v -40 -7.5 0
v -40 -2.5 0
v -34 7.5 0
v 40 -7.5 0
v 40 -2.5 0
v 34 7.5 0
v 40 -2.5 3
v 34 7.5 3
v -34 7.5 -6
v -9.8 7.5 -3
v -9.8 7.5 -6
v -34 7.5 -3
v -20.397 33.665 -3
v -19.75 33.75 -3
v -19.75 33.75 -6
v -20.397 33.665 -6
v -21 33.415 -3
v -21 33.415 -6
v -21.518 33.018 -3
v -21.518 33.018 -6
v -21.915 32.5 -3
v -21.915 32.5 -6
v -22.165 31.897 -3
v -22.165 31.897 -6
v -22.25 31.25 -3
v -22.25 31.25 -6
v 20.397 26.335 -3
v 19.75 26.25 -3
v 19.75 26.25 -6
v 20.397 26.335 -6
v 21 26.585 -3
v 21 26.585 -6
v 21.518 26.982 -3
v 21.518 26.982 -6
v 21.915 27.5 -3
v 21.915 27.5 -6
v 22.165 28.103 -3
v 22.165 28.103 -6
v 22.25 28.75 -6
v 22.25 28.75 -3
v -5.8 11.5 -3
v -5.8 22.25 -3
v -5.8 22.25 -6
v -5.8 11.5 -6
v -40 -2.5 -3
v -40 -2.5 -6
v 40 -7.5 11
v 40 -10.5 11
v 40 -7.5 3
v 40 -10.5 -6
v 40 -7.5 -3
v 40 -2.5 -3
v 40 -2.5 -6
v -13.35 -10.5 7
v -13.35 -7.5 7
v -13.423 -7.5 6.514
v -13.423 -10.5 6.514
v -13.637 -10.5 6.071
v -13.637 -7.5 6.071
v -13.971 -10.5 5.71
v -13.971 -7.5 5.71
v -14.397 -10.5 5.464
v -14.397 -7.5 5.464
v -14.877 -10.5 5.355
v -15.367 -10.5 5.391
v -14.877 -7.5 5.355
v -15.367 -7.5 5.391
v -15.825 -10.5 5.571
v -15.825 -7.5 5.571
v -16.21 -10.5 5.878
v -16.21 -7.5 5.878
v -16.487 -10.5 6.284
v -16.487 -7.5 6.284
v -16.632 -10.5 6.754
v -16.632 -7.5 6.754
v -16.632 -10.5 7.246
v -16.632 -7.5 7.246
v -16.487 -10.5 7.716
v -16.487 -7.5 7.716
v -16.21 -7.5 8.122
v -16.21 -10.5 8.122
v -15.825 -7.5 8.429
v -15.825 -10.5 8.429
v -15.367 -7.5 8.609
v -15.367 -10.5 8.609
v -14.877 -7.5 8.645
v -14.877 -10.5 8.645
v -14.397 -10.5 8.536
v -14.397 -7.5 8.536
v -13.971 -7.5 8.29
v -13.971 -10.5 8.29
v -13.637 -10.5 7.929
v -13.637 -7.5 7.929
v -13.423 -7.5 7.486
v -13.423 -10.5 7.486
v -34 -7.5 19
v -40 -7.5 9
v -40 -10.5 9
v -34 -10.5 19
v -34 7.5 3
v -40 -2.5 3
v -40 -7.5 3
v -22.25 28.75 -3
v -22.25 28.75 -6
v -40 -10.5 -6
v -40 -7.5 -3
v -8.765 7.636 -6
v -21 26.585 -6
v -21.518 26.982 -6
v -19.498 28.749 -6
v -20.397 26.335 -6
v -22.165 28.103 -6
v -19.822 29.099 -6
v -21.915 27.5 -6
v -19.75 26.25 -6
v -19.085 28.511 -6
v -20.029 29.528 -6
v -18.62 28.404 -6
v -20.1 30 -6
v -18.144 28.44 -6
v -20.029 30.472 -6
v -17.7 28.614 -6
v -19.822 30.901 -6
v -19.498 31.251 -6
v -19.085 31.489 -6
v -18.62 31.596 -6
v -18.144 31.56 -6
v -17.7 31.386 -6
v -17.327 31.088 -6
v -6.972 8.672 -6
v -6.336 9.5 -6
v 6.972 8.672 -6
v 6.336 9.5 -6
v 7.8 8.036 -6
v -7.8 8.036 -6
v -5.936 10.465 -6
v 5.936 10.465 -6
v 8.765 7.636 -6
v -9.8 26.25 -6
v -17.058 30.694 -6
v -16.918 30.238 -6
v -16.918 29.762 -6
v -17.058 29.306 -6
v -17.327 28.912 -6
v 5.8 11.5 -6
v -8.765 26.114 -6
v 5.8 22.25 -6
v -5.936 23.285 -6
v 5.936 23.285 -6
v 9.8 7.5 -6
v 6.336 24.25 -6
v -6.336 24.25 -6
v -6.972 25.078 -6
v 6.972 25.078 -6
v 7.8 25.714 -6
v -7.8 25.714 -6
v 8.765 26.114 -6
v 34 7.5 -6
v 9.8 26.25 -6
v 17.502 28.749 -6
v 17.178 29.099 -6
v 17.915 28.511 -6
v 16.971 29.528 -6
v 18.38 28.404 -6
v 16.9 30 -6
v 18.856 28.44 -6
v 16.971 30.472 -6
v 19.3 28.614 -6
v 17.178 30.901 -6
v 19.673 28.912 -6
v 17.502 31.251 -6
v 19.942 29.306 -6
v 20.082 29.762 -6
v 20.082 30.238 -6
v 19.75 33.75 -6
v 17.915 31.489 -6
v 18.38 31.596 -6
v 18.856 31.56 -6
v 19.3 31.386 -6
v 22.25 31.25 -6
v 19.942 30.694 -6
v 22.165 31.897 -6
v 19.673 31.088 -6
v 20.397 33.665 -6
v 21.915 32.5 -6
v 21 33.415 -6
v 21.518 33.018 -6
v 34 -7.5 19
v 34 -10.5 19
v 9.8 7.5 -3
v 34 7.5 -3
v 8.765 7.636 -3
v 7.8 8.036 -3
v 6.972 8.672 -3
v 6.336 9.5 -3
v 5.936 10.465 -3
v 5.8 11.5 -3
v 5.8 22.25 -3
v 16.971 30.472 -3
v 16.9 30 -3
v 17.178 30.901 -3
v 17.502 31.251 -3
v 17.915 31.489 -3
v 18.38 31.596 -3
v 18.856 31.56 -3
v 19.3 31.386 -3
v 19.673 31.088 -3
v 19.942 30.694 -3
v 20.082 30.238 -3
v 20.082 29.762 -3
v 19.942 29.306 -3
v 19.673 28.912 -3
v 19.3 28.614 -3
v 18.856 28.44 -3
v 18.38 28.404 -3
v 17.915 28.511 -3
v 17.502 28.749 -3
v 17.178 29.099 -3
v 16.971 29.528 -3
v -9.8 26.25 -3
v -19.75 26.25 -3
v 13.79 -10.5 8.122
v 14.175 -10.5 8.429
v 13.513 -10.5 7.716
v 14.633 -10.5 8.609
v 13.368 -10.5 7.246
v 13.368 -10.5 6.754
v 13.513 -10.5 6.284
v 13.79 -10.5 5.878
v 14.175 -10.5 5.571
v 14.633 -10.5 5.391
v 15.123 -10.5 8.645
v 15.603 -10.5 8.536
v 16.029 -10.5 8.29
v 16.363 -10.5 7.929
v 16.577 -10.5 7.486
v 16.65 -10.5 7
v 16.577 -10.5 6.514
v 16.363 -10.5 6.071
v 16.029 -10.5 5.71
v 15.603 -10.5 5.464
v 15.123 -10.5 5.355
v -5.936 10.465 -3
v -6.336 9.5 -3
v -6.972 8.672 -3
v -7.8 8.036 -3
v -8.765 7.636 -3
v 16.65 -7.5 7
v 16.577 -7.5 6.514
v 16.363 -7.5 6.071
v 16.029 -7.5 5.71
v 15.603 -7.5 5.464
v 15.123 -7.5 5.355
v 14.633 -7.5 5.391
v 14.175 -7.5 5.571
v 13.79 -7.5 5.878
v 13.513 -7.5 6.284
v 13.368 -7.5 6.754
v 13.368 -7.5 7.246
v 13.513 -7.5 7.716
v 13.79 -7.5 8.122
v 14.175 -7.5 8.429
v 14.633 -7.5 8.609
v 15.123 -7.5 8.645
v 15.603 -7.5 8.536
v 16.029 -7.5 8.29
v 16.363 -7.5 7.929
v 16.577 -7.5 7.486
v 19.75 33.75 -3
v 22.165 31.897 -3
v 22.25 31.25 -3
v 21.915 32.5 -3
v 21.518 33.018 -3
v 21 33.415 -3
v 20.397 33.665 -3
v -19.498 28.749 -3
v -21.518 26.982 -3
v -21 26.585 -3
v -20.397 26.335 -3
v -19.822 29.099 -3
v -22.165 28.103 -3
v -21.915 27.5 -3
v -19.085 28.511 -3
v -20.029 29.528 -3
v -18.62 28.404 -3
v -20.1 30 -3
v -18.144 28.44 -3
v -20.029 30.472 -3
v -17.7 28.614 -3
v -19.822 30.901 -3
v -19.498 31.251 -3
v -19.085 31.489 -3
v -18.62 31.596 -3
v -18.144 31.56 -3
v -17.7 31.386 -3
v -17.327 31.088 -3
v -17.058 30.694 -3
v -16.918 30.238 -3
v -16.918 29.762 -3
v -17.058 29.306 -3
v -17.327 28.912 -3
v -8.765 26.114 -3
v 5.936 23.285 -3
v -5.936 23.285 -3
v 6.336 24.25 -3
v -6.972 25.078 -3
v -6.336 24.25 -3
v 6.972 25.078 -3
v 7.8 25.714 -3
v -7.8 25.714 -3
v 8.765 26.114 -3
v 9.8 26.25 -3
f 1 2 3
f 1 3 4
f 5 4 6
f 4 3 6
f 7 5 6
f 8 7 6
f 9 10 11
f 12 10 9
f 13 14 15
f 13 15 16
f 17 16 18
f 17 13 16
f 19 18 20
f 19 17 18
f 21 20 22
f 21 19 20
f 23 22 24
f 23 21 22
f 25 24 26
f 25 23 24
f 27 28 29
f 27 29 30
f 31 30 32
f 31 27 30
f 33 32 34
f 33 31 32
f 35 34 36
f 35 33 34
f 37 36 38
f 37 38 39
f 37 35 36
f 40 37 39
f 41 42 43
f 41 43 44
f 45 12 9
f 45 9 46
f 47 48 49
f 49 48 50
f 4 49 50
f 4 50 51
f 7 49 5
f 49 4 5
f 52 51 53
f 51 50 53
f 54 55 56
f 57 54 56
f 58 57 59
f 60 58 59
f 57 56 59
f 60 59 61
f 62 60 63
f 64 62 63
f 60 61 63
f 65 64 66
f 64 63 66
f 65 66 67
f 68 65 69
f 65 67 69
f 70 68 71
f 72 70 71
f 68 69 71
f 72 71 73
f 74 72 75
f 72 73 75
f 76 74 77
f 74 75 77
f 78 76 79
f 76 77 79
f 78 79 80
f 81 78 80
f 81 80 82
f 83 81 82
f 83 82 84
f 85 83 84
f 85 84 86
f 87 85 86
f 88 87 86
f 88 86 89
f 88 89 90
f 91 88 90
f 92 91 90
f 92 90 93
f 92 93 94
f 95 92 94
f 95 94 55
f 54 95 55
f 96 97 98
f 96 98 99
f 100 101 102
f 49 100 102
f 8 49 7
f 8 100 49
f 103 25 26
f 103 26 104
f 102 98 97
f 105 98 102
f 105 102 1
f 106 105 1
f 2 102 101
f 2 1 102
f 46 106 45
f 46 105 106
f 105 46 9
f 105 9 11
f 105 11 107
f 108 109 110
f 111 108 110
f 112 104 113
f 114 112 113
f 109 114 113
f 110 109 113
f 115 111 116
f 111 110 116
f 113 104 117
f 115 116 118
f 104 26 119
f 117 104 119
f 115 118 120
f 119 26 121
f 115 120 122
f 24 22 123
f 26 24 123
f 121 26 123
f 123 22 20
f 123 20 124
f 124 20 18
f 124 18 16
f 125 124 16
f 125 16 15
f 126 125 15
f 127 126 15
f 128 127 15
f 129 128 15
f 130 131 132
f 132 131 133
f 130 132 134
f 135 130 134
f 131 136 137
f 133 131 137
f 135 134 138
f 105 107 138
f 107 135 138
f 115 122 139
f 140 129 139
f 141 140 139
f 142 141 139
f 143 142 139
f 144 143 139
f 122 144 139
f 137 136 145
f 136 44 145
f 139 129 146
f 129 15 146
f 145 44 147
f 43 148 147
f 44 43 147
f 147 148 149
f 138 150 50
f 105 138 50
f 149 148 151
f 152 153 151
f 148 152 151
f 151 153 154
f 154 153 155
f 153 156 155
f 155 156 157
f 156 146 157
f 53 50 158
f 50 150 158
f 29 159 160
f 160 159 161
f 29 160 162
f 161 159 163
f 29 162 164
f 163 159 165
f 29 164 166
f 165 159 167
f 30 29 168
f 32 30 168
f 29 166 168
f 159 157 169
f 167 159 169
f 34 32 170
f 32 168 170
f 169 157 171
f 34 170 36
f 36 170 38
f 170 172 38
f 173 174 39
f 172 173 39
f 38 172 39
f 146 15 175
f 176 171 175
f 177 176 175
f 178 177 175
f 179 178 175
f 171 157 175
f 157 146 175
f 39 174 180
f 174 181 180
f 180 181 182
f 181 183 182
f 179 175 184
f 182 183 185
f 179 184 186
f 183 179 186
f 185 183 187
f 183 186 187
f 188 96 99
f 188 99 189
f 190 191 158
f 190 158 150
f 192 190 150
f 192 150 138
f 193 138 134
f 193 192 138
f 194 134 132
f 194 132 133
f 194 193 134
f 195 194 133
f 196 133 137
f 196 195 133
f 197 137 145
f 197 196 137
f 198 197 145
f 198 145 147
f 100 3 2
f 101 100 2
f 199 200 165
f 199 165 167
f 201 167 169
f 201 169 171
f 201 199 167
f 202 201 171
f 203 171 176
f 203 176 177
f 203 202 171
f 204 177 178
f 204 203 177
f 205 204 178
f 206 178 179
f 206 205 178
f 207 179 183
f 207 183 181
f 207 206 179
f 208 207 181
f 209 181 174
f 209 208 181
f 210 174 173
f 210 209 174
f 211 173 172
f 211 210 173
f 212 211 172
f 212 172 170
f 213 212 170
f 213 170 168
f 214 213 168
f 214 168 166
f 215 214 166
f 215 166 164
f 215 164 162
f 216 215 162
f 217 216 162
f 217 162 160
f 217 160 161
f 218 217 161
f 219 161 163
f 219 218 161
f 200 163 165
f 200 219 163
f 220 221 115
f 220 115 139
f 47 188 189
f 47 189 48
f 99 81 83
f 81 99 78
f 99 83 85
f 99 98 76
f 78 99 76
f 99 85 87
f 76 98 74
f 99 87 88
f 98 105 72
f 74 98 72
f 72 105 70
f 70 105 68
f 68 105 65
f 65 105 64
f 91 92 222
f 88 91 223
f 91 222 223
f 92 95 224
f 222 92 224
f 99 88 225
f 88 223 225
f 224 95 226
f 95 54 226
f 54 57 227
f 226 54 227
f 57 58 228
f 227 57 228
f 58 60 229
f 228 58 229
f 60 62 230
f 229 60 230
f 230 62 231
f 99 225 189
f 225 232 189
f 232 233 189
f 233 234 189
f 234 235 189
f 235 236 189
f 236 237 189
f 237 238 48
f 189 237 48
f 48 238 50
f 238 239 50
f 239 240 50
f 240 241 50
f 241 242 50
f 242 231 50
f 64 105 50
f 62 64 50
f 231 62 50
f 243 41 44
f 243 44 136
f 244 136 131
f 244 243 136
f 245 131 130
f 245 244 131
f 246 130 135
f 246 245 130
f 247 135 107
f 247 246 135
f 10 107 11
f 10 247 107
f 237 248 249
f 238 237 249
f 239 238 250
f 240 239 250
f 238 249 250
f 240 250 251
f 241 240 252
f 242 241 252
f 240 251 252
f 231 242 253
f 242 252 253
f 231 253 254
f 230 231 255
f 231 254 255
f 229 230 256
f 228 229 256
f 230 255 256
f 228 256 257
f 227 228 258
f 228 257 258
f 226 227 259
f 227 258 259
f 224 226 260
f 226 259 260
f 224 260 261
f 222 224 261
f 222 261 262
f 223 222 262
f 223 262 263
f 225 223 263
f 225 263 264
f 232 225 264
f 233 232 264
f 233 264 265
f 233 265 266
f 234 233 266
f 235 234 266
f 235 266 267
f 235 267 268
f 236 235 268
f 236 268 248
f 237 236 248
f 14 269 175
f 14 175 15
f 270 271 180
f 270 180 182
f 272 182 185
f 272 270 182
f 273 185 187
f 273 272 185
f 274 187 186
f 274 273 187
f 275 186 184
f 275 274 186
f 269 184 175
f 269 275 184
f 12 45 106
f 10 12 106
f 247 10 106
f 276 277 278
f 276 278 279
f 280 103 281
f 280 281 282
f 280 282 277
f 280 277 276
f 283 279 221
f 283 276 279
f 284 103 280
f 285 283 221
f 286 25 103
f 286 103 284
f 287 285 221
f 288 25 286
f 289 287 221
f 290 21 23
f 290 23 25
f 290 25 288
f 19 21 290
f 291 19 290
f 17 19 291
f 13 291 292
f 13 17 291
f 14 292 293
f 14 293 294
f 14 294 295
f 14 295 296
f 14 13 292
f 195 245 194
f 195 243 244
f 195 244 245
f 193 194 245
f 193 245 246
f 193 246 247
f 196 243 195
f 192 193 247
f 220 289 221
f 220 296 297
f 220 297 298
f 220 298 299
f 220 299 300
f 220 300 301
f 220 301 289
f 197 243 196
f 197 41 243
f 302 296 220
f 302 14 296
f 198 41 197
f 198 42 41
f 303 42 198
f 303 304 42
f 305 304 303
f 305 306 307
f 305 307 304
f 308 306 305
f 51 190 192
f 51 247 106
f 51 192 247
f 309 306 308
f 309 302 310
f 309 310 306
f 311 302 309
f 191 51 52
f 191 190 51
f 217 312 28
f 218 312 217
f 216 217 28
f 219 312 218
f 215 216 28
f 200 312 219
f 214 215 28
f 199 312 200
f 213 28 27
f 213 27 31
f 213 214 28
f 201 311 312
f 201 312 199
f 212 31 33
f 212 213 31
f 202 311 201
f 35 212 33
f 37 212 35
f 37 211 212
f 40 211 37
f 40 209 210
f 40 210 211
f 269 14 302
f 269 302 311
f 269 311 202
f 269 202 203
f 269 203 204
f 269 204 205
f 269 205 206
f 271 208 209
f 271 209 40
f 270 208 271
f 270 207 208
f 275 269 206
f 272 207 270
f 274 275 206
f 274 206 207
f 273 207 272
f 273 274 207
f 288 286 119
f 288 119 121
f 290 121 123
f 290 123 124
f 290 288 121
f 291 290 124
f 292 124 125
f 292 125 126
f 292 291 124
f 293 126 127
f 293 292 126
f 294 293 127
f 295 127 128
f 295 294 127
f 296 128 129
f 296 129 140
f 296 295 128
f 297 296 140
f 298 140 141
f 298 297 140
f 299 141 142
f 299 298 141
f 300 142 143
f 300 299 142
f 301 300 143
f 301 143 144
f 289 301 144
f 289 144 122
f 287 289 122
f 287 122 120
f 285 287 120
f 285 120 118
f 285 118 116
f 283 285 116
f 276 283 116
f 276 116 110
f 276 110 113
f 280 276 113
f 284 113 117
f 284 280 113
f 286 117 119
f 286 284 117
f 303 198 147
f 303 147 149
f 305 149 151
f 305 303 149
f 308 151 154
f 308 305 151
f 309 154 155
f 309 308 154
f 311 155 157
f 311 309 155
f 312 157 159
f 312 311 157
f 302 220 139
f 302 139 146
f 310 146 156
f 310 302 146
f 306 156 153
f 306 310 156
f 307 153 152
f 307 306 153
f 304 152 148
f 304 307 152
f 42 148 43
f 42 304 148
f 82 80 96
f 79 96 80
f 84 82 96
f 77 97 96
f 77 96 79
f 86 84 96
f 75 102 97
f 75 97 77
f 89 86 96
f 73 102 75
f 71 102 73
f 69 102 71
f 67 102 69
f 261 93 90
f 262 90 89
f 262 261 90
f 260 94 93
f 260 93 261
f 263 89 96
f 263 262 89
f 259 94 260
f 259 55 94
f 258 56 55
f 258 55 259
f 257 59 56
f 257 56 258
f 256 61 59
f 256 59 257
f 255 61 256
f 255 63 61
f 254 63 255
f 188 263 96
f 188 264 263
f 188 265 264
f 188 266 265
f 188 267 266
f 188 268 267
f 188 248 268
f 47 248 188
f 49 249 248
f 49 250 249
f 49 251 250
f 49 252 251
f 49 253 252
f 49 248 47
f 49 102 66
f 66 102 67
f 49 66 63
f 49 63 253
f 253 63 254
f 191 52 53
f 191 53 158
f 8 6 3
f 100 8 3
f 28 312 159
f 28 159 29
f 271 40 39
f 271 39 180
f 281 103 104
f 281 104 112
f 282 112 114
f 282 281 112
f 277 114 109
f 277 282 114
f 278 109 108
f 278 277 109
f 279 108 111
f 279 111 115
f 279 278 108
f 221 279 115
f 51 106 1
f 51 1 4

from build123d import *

# Parameters (mm, degrees)
BOSS_EXTRUDE1_DEPTH = 3
SKETCH3_R           = 1.6
BOSS_EXTRUDE2_DEPTH = 3
SKETCH2_W           = 80
SKETCH2_H           = 3
BOSS_EXTRUDE3_DEPTH = 3
SKETCH8_W           = 80
SKETCH8_H           = 3
BOSS_EXTRUDE6_DEPTH = 16
SKETCH21_R          = 1.65
CUT_EXTRUDE1_DEPTH  = 4
CUT_EXTRUDE2_DEPTH  = 4


with BuildPart() as part:
    # Sketch1 → Boss-Extrude1 (new body)
    with BuildSketch(Plane.XY):
        Polygon((40, -2.5), (34, 7.5), (-34, 7.5), (-40, -2.5), (-40, -7.5), (40, -7.5), align=None)
    extrude(amount=BOSS_EXTRUDE1_DEPTH)



with BuildPart() as body_2:
    # Sketch3 → Boss-Extrude2 (new body)
    with BuildSketch(Plane(origin=(0, 0, -3), x_dir=(-1, 0, 0), z_dir=(0, 0, -1))):
        with BuildLine():
            Line((40, -7.5), (-40, -7.5))
            Line((-40, -7.5), (-40, -2.5))
            Line((-40, -2.5), (-34, 7.5))
            Line((-34, 7.5), (-9.8, 7.5))
            ThreePointArc((-9.8, 7.5), (-6.971572875, 8.671572875), (-5.8, 11.5))
            Line((-5.8, 11.5), (-5.8, 22.25))
            ThreePointArc((-5.8, 22.25), (-6.971572875, 25.078427125), (-9.8, 26.25))
            Line((-9.8, 26.25), (-19.75, 26.25))
            ThreePointArc((-19.75, 26.25), (-21.517766953, 26.982233047), (-22.25, 28.75))
            Line((-22.25, 28.75), (-22.25, 31.25))
            ThreePointArc((-22.25, 31.25), (-21.517766953, 33.017766953), (-19.75, 33.75))
            Line((-19.75, 33.75), (19.75, 33.75))
            ThreePointArc((19.75, 33.75), (21.517766953, 33.017766953), (22.25, 31.25))
            Line((22.25, 31.25), (22.25, 28.75))
            ThreePointArc((22.25, 28.75), (21.517766953, 26.982233047), (19.75, 26.25))
            Line((19.75, 26.25), (9.8, 26.25))
            ThreePointArc((9.8, 26.25), (6.971572875, 25.078427125), (5.8, 22.25))
            Line((5.8, 22.25), (5.8, 11.5))
            ThreePointArc((5.8, 11.5), (6.971572875, 8.671572875), (9.8, 7.5))
            Line((9.8, 7.5), (34, 7.5))
            Line((34, 7.5), (40, -2.5))
            Line((40, -2.5), (40, -7.5))
        make_face()
        with Locations((-18.5, 30)):
            Circle(SKETCH3_R, mode=Mode.SUBTRACT)
        with Locations((18.5, 30)):
            Circle(SKETCH3_R, mode=Mode.SUBTRACT)
    extrude(amount=BOSS_EXTRUDE2_DEPTH)


with BuildPart() as part_1:
    add(part.part)

    add(body_2.part)  # Boss-Extrude3 merges body 2
    # Sketch2 → Boss-Extrude3 (add)
    with BuildSketch(Plane(origin=(0, -7.5, 0), x_dir=(1, 0, 0), z_dir=(0, 1, 0))):
        with Locations((0, 4.5)):
            Rectangle(SKETCH2_W, SKETCH2_H)
        with Locations((0, 1.5)):
            Rectangle(SKETCH2_W, SKETCH2_H)
        with Locations((0, -1.5)):
            Rectangle(SKETCH2_W, SKETCH2_H)
    extrude(amount=-BOSS_EXTRUDE3_DEPTH)

    # Sketch8 → Boss-Extrude6 (add)
    with BuildSketch(Plane.XY.offset(3)):
        with Locations((0, -9)):
            Rectangle(SKETCH8_W, SKETCH8_H)
    extrude(amount=BOSS_EXTRUDE6_DEPTH)

    # Sketch21 → Cut-Extrude1 (cut, through all)
    with BuildSketch(Plane(origin=(0, -7.5, 0), x_dir=(1, 0, 0), z_dir=(0, 1, 0))):
        with Locations((-15, -7)):
            Circle(SKETCH21_R)
        with Locations((15, -7)):
            Circle(SKETCH21_R)
    extrude(amount=-CUT_EXTRUDE1_DEPTH, mode=Mode.SUBTRACT)

    # Sketch24 → Cut-Extrude2 (cut, through all)
    with BuildSketch(Plane(origin=(0, -7.5, 0), x_dir=(1, 0, 0), z_dir=(0, 1, 0))):
        Polygon((-40, -19), (-40, -9), (-34, -19), align=None)
        Polygon((40, -19), (34, -19), (40, -11), align=None)
    extrude(amount=-CUT_EXTRUDE2_DEPTH, mode=Mode.SUBTRACT)


solid = part_1.part
